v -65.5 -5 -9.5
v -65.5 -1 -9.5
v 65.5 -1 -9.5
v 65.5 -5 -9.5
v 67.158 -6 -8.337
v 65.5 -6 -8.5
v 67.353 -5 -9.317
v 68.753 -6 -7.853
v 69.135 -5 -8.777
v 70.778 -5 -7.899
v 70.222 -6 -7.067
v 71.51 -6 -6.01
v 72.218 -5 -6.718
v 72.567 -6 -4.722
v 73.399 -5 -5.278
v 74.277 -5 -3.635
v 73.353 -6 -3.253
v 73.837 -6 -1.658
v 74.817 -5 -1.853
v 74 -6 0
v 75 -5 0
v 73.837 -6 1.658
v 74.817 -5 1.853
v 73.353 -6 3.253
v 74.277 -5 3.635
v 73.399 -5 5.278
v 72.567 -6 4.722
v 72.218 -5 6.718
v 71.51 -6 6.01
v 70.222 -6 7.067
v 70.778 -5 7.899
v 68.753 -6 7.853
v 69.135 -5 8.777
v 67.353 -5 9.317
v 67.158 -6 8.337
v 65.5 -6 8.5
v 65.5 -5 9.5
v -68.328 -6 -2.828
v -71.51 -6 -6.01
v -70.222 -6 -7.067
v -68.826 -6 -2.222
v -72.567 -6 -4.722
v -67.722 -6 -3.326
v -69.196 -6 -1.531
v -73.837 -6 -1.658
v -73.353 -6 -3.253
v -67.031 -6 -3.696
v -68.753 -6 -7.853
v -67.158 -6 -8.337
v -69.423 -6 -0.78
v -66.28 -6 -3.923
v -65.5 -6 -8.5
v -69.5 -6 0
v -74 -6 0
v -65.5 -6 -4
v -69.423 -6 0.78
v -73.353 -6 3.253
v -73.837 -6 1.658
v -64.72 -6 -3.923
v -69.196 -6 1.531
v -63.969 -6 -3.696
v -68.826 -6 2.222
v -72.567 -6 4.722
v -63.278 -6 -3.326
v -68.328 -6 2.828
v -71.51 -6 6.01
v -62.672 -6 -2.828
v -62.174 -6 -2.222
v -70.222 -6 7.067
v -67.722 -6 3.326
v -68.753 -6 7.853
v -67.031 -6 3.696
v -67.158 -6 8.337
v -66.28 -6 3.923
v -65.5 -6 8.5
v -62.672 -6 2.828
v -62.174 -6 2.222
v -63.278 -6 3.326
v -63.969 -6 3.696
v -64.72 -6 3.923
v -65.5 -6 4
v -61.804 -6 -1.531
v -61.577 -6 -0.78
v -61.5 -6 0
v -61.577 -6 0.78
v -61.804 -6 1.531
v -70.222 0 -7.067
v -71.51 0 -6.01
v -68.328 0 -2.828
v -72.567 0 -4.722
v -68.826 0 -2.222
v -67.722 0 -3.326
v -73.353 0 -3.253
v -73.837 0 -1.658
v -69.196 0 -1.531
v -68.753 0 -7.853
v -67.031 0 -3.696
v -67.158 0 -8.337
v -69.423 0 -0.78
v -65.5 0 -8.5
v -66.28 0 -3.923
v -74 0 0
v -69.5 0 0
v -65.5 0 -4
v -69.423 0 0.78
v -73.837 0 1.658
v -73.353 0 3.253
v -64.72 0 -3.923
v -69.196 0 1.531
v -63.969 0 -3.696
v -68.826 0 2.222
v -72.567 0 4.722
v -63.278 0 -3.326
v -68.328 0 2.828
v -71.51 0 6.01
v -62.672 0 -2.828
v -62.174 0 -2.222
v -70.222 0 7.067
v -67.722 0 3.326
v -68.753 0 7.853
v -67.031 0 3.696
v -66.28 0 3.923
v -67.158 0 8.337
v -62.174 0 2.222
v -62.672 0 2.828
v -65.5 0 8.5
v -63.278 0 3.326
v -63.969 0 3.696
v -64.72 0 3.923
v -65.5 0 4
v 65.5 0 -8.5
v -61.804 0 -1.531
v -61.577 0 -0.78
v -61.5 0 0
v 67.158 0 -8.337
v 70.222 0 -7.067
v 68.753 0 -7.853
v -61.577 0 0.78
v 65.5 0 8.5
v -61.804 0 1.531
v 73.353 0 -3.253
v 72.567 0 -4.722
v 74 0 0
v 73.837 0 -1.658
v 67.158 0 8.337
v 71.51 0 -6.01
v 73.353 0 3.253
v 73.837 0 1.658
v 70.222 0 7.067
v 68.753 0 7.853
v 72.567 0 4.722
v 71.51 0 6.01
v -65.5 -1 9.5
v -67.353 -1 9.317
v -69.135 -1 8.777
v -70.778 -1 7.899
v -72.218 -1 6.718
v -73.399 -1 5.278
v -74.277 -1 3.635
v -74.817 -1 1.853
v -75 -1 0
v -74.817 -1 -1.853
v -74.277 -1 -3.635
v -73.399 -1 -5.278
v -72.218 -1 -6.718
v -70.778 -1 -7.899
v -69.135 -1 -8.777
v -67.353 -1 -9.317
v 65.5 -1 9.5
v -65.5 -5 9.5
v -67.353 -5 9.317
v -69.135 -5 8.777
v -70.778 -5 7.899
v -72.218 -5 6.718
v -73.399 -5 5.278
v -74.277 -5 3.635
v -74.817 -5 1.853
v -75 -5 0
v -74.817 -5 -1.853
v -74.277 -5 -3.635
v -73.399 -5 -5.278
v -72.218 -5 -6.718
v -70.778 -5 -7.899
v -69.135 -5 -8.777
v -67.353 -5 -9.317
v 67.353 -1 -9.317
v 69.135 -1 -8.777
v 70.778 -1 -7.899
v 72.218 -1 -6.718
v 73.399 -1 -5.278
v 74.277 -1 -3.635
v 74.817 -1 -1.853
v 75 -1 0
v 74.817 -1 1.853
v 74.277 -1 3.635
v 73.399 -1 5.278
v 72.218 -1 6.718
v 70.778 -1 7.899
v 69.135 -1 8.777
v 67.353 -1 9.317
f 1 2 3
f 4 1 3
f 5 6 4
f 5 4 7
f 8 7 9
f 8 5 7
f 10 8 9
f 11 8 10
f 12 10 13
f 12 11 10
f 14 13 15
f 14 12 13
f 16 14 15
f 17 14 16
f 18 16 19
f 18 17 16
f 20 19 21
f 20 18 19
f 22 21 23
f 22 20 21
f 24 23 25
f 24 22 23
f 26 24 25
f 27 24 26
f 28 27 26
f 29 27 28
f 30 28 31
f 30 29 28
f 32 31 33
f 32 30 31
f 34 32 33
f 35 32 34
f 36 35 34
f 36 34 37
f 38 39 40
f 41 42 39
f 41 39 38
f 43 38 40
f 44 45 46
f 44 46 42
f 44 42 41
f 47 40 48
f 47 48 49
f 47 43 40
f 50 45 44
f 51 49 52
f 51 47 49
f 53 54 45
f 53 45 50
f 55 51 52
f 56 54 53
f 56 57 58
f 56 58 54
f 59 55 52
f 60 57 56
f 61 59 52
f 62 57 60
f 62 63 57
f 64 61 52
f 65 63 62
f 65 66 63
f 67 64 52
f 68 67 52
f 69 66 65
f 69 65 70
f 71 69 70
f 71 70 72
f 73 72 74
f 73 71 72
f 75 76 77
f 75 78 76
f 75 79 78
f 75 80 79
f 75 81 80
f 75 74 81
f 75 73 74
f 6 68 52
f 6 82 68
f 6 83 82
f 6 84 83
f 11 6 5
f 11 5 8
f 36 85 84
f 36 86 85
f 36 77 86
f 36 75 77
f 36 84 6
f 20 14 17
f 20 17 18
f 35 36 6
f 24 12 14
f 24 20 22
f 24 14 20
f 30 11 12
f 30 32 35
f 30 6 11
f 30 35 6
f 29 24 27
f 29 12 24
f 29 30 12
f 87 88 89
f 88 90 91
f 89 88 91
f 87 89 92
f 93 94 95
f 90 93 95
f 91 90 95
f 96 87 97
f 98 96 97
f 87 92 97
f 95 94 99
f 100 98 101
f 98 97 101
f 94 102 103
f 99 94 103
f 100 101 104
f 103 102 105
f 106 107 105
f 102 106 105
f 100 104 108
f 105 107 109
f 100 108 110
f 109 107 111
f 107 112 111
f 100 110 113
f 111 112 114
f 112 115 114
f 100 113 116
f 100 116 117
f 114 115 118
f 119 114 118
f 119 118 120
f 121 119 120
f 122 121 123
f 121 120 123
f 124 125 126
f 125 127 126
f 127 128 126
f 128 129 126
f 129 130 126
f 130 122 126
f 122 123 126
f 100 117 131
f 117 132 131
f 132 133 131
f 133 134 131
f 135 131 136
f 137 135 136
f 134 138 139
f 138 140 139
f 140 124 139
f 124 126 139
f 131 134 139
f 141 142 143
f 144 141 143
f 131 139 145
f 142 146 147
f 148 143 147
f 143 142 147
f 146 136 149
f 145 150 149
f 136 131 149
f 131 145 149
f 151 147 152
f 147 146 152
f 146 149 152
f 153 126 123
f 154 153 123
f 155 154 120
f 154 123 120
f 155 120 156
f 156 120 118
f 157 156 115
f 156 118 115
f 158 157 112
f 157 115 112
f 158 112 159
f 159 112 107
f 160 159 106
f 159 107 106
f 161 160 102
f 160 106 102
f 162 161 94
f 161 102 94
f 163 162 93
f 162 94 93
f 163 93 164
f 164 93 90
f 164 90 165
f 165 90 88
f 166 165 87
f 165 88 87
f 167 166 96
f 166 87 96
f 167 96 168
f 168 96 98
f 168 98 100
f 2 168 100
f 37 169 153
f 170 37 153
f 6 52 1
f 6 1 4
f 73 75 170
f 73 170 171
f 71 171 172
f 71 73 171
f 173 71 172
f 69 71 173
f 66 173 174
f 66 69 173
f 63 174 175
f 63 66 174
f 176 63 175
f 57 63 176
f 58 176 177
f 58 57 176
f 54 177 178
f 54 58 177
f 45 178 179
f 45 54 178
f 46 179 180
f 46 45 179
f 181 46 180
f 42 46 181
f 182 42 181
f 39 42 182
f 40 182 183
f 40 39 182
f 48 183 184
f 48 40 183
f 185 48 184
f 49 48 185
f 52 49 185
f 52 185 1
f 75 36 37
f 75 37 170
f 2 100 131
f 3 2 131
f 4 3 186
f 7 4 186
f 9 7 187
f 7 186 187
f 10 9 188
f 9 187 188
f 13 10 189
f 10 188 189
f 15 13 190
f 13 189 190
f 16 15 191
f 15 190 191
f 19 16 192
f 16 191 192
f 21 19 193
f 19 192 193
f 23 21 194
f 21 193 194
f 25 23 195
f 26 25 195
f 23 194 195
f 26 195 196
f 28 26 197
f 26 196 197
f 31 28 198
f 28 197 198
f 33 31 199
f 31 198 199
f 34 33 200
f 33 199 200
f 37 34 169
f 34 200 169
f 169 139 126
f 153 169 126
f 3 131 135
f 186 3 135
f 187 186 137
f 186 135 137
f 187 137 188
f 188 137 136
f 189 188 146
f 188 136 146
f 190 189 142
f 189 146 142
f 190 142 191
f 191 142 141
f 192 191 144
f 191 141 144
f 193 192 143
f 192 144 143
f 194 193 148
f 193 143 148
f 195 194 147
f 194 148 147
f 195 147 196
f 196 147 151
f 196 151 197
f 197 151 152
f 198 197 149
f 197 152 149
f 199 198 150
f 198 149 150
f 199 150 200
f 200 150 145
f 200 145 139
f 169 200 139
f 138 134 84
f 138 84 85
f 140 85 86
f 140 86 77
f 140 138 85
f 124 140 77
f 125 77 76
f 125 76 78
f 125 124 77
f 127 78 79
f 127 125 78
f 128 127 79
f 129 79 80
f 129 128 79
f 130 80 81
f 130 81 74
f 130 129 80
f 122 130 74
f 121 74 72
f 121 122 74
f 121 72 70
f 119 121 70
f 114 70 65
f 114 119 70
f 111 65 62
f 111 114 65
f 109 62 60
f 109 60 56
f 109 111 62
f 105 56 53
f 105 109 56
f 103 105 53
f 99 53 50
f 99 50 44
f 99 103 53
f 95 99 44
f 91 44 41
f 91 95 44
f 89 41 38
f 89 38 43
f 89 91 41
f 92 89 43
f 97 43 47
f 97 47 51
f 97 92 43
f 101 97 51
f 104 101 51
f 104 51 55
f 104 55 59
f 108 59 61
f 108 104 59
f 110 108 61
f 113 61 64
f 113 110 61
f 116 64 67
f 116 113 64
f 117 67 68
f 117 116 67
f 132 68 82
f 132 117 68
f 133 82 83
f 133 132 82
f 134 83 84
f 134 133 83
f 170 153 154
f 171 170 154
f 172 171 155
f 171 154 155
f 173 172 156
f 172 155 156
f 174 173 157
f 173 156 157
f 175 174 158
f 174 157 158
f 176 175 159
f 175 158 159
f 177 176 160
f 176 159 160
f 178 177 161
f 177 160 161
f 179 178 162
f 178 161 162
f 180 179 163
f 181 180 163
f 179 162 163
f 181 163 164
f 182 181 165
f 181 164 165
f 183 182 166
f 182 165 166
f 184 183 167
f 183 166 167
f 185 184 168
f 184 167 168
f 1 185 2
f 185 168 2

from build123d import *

# Parameters (mm, degrees)
F0_R     = 4
F1_DEPTH = 6
F2_SIZE  = 1


with BuildPart() as f1:
    # F0 (on Front) → F1 (new body)
    with BuildSketch(Plane.XZ):
        with BuildLine():
            Line((65.5, 9.5), (-65.5, 9.5))
            ThreePointArc((-65.5, 9.5), (-75, 0), (-65.5, -9.5))
            Line((-65.5, -9.5), (65.5, -9.5))
            ThreePointArc((65.5, -9.5), (75, 0), (65.5, 9.5))
        make_face()
        with Locations((-65.5, 0)):
            Circle(F0_R, mode=Mode.SUBTRACT)
    extrude(amount=F1_DEPTH)

    # F2
    f2_edges = [f1.edges().sort_by_distance(p)[0] for p in [
        (0, -6, -9.5),
        (0, 0, -9.5),
    ]]
    chamfer(f2_edges, length=F2_SIZE)


solid = f1.part
